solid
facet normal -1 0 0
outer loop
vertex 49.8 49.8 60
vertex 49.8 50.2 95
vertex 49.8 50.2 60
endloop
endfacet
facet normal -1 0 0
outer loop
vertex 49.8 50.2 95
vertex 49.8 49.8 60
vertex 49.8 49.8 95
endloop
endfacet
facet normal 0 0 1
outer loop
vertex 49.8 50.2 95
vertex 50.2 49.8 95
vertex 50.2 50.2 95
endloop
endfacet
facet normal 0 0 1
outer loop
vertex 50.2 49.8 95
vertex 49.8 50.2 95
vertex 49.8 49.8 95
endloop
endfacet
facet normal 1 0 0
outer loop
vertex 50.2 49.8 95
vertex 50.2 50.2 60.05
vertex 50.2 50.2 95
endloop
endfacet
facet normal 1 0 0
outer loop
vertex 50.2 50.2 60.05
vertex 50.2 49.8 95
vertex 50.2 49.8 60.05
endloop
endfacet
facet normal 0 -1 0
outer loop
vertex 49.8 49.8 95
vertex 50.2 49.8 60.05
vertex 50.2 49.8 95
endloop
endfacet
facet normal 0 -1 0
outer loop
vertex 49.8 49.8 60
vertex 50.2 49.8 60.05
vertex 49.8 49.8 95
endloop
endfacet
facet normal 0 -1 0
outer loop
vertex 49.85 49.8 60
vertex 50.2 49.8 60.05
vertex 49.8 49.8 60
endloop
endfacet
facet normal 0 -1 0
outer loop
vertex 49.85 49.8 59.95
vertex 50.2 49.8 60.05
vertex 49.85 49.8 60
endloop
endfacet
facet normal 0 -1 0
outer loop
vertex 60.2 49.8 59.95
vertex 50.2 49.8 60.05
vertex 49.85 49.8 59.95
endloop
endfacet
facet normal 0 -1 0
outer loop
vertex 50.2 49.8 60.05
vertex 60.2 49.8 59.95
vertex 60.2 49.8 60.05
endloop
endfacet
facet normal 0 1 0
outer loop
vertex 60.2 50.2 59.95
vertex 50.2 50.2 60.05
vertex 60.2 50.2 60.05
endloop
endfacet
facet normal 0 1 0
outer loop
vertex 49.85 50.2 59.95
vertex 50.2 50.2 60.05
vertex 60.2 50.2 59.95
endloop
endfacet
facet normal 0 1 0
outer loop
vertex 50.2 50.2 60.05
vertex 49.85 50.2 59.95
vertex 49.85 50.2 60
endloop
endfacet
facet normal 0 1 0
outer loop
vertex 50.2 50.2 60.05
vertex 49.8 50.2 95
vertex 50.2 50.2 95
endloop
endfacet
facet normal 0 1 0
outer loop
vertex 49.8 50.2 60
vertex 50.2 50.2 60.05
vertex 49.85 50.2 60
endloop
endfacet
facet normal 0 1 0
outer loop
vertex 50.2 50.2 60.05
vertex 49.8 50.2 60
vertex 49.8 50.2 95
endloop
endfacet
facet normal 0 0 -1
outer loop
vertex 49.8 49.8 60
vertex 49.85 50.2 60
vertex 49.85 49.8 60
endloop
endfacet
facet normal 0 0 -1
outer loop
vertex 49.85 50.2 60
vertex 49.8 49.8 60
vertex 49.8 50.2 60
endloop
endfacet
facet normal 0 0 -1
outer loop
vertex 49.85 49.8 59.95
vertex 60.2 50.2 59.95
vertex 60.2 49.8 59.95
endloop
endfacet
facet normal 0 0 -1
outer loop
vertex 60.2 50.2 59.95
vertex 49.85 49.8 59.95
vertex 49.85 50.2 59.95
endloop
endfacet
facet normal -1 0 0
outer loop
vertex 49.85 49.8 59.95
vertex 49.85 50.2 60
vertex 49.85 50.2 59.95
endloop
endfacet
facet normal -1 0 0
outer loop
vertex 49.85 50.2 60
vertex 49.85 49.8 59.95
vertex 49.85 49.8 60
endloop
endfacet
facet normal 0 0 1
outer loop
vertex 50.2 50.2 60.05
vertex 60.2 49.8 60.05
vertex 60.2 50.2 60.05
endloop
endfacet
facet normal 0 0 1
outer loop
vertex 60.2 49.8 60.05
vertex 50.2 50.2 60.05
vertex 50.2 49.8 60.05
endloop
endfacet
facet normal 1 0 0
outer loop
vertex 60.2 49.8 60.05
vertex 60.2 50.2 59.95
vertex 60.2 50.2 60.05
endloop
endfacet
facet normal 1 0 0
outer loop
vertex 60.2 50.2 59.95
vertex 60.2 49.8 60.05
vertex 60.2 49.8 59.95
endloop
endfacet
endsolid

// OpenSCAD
hull() {
    translate([50.0, 50.0, 94.95]) cube([0.4, 0.4, 0.1], center=true);
    translate([50.0, 50.0, 94.05000000000001]) cube([0.4, 0.4, 0.1], center=true);
}


hull() {
    translate([50.0, 50.0, 93.95]) cube([0.4, 0.4, 0.1], center=true);
    translate([50.0, 50.0, 93.05]) cube([0.4, 0.4, 0.1], center=true);
}


hull() {
    translate([50.0, 50.0, 92.95]) cube([0.4, 0.4, 0.1], center=true);
    translate([50.0, 50.0, 92.05]) cube([0.4, 0.4, 0.1], center=true);
}


hull() {
    translate([50.0, 50.0, 91.95]) cube([0.4, 0.4, 0.1], center=true);
    translate([50.0, 50.0, 91.05000000000001]) cube([0.4, 0.4, 0.1], center=true);
}


hull() {
    translate([50.0, 50.0, 90.95]) cube([0.4, 0.4, 0.1], center=true);
    translate([50.0, 50.0, 90.05]) cube([0.4, 0.4, 0.1], center=true);
}


hull() {
    translate([50.0, 50.0, 89.95]) cube([0.4, 0.4, 0.1], center=true);
    translate([50.0, 50.0, 89.05000000000001]) cube([0.4, 0.4, 0.1], center=true);
}


hull() {
    translate([50.0, 50.0, 88.95]) cube([0.4, 0.4, 0.1], center=true);
    translate([50.0, 50.0, 88.05]) cube([0.4, 0.4, 0.1], center=true);
}


hull() {
    translate([50.0, 50.0, 87.95]) cube([0.4, 0.4, 0.1], center=true);
    translate([50.0, 50.0, 87.05]) cube([0.4, 0.4, 0.1], center=true);
}


hull() {
    translate([50.0, 50.0, 86.95]) cube([0.4, 0.4, 0.1], center=true);
    translate([50.0, 50.0, 86.05000000000001]) cube([0.4, 0.4, 0.1], center=true);
}


hull() {
    translate([50.0, 50.0, 85.95]) cube([0.4, 0.4, 0.1], center=true);
    translate([50.0, 50.0, 85.05]) cube([0.4, 0.4, 0.1], center=true);
}


hull() {
    translate([50.0, 50.0, 84.95]) cube([0.4, 0.4, 0.1], center=true);
    translate([50.0, 50.0, 84.05000000000001]) cube([0.4, 0.4, 0.1], center=true);
}


hull() {
    translate([50.0, 50.0, 83.95]) cube([0.4, 0.4, 0.1], center=true);
    translate([50.0, 50.0, 83.05]) cube([0.4, 0.4, 0.1], center=true);
}


hull() {
    translate([50.0, 50.0, 82.95]) cube([0.4, 0.4, 0.1], center=true);
    translate([50.0, 50.0, 82.05]) cube([0.4, 0.4, 0.1], center=true);
}


hull() {
    translate([50.0, 50.0, 81.95]) cube([0.4, 0.4, 0.1], center=true);
    translate([50.0, 50.0, 81.05000000000001]) cube([0.4, 0.4, 0.1], center=true);
}


hull() {
    translate([50.0, 50.0, 80.95]) cube([0.4, 0.4, 0.1], center=true);
    translate([50.0, 50.0, 80.05]) cube([0.4, 0.4, 0.1], center=true);
}


hull() {
    translate([50.0, 50.0, 79.95]) cube([0.4, 0.4, 0.1], center=true);
    translate([50.0, 50.0, 79.05000000000001]) cube([0.4, 0.4, 0.1], center=true);
}


hull() {
    translate([50.0, 50.0, 78.95]) cube([0.4, 0.4, 0.1], center=true);
    translate([50.0, 50.0, 78.05]) cube([0.4, 0.4, 0.1], center=true);
}


hull() {
    translate([50.0, 50.0, 77.95]) cube([0.4, 0.4, 0.1], center=true);
    translate([50.0, 50.0, 77.05]) cube([0.4, 0.4, 0.1], center=true);
}


hull() {
    translate([50.0, 50.0, 76.95]) cube([0.4, 0.4, 0.1], center=true);
    translate([50.0, 50.0, 76.05000000000001]) cube([0.4, 0.4, 0.1], center=true);
}


hull() {
    translate([50.0, 50.0, 75.95]) cube([0.4, 0.4, 0.1], center=true);
    translate([50.0, 50.0, 75.05]) cube([0.4, 0.4, 0.1], center=true);
}


hull() {
    translate([50.0, 50.0, 74.95]) cube([0.4, 0.4, 0.1], center=true);
    translate([50.0, 50.0, 74.05000000000001]) cube([0.4, 0.4, 0.1], center=true);
}


hull() {
    translate([50.0, 50.0, 73.95]) cube([0.4, 0.4, 0.1], center=true);
    translate([50.0, 50.0, 73.05]) cube([0.4, 0.4, 0.1], center=true);
}


hull() {
    translate([50.0, 50.0, 72.95]) cube([0.4, 0.4, 0.1], center=true);
    translate([50.0, 50.0, 72.05]) cube([0.4, 0.4, 0.1], center=true);
}


hull() {
    translate([50.0, 50.0, 71.95]) cube([0.4, 0.4, 0.1], center=true);
    translate([50.0, 50.0, 71.05]) cube([0.4, 0.4, 0.1], center=true);
}


hull() {
    translate([50.0, 50.0, 70.95]) cube([0.4, 0.4, 0.1], center=true);
    translate([50.0, 50.0, 70.05]) cube([0.4, 0.4, 0.1], center=true);
}


hull() {
    translate([50.0, 50.0, 69.95]) cube([0.4, 0.4, 0.1], center=true);
    translate([50.0, 50.0, 69.05]) cube([0.4, 0.4, 0.1], center=true);
}


hull() {
    translate([50.0, 50.0, 68.95]) cube([0.4, 0.4, 0.1], center=true);
    translate([50.0, 50.0, 68.05]) cube([0.4, 0.4, 0.1], center=true);
}


hull() {
    translate([50.0, 50.0, 67.95]) cube([0.4, 0.4, 0.1], center=true);
    translate([50.0, 50.0, 67.05000000000001]) cube([0.4, 0.4, 0.1], center=true);
}


hull() {
    translate([50.0, 50.0, 66.95]) cube([0.4, 0.4, 0.1], center=true);
    translate([50.0, 50.0, 66.05]) cube([0.4, 0.4, 0.1], center=true);
}


hull() {
    translate([50.0, 50.0, 65.95]) cube([0.4, 0.4, 0.1], center=true);
    translate([50.0, 50.0, 65.05]) cube([0.4, 0.4, 0.1], center=true);
}


hull() {
    translate([50.0, 50.0, 64.95]) cube([0.4, 0.4, 0.1], center=true);
    translate([50.0, 50.0, 64.05]) cube([0.4, 0.4, 0.1], center=true);
}


hull() {
    translate([50.0, 50.0, 63.95]) cube([0.4, 0.4, 0.1], center=true);
    translate([50.0, 50.0, 63.050000000000004]) cube([0.4, 0.4, 0.1], center=true);
}


hull() {
    translate([50.0, 50.0, 62.95]) cube([0.4, 0.4, 0.1], center=true);
    translate([50.0, 50.0, 62.050000000000004]) cube([0.4, 0.4, 0.1], center=true);
}


hull() {
    translate([50.0, 50.0, 61.95]) cube([0.4, 0.4, 0.1], center=true);
    translate([50.0, 50.0, 61.05]) cube([0.4, 0.4, 0.1], center=true);
}


hull() {
    translate([50.0, 50.0, 60.95]) cube([0.4, 0.4, 0.1], center=true);
    translate([50.0, 50.0, 60.05]) cube([0.4, 0.4, 0.1], center=true);
}


hull() {
    translate([50.05, 50.0, 60.0]) cube([0.4, 0.4, 0.1], center=true);
    translate([50.95, 50.0, 60.0]) cube([0.4, 0.4, 0.1], center=true);
}


hull() {
    translate([51.05, 50.0, 60.0]) cube([0.4, 0.4, 0.1], center=true);
    translate([51.95, 50.0, 60.0]) cube([0.4, 0.4, 0.1], center=true);
}


hull() {
    translate([52.050000000000004, 50.0, 60.0]) cube([0.4, 0.4, 0.1], center=true);
    translate([52.95, 50.0, 60.0]) cube([0.4, 0.4, 0.1], center=true);
}


hull() {
    translate([53.050000000000004, 50.0, 60.0]) cube([0.4, 0.4, 0.1], center=true);
    translate([53.95, 50.0, 60.0]) cube([0.4, 0.4, 0.1], center=true);
}


hull() {
    translate([54.050000000000004, 50.0, 60.0]) cube([0.4, 0.4, 0.1], center=true);
    translate([54.95, 50.0, 60.0]) cube([0.4, 0.4, 0.1], center=true);
}


hull() {
    translate([55.05, 50.0, 60.0]) cube([0.4, 0.4, 0.1], center=true);
    translate([55.95, 50.0, 60.0]) cube([0.4, 0.4, 0.1], center=true);
}


hull() {
    translate([56.05, 50.0, 60.0]) cube([0.4, 0.4, 0.1], center=true);
    translate([56.95, 50.0, 60.0]) cube([0.4, 0.4, 0.1], center=true);
}


hull() {
    translate([57.050000000000004, 50.0, 60.0]) cube([0.4, 0.4, 0.1], center=true);
    translate([57.95, 50.0, 60.0]) cube([0.4, 0.4, 0.1], center=true);
}


hull() {
    translate([58.050000000000004, 50.0, 60.0]) cube([0.4, 0.4, 0.1], center=true);
    translate([58.95, 50.0, 60.0]) cube([0.4, 0.4, 0.1], center=true);
}


hull() {
    translate([59.050000000000004, 50.0, 60.0]) cube([0.4, 0.4, 0.1], center=true);
    translate([59.95, 50.0, 60.0]) cube([0.4, 0.4, 0.1], center=true);
}


hull() {
    translate([60.0, 50.0, 60.0]) cube([0.4, 0.4, 0.1], center=true);
    translate([60.0, 50.0, 60.0]) cube([0.4, 0.4, 0.1], center=true);
}


hull() {
    translate([60.0, 50.0, 60.0]) cube([0.4, 0.4, 0.1], center=true);
    translate([60.0, 50.0, 60.0]) cube([0.4, 0.4, 0.1], center=true);
}


hull() {
    translate([60.0, 50.0, 60.0]) cube([0.4, 0.4, 0.1], center=true);
    translate([60.0, 50.0, 60.0]) cube([0.4, 0.4, 0.1], center=true);
}


hull() {
    translate([60.0, 50.0, 60.0]) cube([0.4, 0.4, 0.1], center=true);
    translate([60.0, 50.0, 60.0]) cube([0.4, 0.4, 0.1], center=true);
}
